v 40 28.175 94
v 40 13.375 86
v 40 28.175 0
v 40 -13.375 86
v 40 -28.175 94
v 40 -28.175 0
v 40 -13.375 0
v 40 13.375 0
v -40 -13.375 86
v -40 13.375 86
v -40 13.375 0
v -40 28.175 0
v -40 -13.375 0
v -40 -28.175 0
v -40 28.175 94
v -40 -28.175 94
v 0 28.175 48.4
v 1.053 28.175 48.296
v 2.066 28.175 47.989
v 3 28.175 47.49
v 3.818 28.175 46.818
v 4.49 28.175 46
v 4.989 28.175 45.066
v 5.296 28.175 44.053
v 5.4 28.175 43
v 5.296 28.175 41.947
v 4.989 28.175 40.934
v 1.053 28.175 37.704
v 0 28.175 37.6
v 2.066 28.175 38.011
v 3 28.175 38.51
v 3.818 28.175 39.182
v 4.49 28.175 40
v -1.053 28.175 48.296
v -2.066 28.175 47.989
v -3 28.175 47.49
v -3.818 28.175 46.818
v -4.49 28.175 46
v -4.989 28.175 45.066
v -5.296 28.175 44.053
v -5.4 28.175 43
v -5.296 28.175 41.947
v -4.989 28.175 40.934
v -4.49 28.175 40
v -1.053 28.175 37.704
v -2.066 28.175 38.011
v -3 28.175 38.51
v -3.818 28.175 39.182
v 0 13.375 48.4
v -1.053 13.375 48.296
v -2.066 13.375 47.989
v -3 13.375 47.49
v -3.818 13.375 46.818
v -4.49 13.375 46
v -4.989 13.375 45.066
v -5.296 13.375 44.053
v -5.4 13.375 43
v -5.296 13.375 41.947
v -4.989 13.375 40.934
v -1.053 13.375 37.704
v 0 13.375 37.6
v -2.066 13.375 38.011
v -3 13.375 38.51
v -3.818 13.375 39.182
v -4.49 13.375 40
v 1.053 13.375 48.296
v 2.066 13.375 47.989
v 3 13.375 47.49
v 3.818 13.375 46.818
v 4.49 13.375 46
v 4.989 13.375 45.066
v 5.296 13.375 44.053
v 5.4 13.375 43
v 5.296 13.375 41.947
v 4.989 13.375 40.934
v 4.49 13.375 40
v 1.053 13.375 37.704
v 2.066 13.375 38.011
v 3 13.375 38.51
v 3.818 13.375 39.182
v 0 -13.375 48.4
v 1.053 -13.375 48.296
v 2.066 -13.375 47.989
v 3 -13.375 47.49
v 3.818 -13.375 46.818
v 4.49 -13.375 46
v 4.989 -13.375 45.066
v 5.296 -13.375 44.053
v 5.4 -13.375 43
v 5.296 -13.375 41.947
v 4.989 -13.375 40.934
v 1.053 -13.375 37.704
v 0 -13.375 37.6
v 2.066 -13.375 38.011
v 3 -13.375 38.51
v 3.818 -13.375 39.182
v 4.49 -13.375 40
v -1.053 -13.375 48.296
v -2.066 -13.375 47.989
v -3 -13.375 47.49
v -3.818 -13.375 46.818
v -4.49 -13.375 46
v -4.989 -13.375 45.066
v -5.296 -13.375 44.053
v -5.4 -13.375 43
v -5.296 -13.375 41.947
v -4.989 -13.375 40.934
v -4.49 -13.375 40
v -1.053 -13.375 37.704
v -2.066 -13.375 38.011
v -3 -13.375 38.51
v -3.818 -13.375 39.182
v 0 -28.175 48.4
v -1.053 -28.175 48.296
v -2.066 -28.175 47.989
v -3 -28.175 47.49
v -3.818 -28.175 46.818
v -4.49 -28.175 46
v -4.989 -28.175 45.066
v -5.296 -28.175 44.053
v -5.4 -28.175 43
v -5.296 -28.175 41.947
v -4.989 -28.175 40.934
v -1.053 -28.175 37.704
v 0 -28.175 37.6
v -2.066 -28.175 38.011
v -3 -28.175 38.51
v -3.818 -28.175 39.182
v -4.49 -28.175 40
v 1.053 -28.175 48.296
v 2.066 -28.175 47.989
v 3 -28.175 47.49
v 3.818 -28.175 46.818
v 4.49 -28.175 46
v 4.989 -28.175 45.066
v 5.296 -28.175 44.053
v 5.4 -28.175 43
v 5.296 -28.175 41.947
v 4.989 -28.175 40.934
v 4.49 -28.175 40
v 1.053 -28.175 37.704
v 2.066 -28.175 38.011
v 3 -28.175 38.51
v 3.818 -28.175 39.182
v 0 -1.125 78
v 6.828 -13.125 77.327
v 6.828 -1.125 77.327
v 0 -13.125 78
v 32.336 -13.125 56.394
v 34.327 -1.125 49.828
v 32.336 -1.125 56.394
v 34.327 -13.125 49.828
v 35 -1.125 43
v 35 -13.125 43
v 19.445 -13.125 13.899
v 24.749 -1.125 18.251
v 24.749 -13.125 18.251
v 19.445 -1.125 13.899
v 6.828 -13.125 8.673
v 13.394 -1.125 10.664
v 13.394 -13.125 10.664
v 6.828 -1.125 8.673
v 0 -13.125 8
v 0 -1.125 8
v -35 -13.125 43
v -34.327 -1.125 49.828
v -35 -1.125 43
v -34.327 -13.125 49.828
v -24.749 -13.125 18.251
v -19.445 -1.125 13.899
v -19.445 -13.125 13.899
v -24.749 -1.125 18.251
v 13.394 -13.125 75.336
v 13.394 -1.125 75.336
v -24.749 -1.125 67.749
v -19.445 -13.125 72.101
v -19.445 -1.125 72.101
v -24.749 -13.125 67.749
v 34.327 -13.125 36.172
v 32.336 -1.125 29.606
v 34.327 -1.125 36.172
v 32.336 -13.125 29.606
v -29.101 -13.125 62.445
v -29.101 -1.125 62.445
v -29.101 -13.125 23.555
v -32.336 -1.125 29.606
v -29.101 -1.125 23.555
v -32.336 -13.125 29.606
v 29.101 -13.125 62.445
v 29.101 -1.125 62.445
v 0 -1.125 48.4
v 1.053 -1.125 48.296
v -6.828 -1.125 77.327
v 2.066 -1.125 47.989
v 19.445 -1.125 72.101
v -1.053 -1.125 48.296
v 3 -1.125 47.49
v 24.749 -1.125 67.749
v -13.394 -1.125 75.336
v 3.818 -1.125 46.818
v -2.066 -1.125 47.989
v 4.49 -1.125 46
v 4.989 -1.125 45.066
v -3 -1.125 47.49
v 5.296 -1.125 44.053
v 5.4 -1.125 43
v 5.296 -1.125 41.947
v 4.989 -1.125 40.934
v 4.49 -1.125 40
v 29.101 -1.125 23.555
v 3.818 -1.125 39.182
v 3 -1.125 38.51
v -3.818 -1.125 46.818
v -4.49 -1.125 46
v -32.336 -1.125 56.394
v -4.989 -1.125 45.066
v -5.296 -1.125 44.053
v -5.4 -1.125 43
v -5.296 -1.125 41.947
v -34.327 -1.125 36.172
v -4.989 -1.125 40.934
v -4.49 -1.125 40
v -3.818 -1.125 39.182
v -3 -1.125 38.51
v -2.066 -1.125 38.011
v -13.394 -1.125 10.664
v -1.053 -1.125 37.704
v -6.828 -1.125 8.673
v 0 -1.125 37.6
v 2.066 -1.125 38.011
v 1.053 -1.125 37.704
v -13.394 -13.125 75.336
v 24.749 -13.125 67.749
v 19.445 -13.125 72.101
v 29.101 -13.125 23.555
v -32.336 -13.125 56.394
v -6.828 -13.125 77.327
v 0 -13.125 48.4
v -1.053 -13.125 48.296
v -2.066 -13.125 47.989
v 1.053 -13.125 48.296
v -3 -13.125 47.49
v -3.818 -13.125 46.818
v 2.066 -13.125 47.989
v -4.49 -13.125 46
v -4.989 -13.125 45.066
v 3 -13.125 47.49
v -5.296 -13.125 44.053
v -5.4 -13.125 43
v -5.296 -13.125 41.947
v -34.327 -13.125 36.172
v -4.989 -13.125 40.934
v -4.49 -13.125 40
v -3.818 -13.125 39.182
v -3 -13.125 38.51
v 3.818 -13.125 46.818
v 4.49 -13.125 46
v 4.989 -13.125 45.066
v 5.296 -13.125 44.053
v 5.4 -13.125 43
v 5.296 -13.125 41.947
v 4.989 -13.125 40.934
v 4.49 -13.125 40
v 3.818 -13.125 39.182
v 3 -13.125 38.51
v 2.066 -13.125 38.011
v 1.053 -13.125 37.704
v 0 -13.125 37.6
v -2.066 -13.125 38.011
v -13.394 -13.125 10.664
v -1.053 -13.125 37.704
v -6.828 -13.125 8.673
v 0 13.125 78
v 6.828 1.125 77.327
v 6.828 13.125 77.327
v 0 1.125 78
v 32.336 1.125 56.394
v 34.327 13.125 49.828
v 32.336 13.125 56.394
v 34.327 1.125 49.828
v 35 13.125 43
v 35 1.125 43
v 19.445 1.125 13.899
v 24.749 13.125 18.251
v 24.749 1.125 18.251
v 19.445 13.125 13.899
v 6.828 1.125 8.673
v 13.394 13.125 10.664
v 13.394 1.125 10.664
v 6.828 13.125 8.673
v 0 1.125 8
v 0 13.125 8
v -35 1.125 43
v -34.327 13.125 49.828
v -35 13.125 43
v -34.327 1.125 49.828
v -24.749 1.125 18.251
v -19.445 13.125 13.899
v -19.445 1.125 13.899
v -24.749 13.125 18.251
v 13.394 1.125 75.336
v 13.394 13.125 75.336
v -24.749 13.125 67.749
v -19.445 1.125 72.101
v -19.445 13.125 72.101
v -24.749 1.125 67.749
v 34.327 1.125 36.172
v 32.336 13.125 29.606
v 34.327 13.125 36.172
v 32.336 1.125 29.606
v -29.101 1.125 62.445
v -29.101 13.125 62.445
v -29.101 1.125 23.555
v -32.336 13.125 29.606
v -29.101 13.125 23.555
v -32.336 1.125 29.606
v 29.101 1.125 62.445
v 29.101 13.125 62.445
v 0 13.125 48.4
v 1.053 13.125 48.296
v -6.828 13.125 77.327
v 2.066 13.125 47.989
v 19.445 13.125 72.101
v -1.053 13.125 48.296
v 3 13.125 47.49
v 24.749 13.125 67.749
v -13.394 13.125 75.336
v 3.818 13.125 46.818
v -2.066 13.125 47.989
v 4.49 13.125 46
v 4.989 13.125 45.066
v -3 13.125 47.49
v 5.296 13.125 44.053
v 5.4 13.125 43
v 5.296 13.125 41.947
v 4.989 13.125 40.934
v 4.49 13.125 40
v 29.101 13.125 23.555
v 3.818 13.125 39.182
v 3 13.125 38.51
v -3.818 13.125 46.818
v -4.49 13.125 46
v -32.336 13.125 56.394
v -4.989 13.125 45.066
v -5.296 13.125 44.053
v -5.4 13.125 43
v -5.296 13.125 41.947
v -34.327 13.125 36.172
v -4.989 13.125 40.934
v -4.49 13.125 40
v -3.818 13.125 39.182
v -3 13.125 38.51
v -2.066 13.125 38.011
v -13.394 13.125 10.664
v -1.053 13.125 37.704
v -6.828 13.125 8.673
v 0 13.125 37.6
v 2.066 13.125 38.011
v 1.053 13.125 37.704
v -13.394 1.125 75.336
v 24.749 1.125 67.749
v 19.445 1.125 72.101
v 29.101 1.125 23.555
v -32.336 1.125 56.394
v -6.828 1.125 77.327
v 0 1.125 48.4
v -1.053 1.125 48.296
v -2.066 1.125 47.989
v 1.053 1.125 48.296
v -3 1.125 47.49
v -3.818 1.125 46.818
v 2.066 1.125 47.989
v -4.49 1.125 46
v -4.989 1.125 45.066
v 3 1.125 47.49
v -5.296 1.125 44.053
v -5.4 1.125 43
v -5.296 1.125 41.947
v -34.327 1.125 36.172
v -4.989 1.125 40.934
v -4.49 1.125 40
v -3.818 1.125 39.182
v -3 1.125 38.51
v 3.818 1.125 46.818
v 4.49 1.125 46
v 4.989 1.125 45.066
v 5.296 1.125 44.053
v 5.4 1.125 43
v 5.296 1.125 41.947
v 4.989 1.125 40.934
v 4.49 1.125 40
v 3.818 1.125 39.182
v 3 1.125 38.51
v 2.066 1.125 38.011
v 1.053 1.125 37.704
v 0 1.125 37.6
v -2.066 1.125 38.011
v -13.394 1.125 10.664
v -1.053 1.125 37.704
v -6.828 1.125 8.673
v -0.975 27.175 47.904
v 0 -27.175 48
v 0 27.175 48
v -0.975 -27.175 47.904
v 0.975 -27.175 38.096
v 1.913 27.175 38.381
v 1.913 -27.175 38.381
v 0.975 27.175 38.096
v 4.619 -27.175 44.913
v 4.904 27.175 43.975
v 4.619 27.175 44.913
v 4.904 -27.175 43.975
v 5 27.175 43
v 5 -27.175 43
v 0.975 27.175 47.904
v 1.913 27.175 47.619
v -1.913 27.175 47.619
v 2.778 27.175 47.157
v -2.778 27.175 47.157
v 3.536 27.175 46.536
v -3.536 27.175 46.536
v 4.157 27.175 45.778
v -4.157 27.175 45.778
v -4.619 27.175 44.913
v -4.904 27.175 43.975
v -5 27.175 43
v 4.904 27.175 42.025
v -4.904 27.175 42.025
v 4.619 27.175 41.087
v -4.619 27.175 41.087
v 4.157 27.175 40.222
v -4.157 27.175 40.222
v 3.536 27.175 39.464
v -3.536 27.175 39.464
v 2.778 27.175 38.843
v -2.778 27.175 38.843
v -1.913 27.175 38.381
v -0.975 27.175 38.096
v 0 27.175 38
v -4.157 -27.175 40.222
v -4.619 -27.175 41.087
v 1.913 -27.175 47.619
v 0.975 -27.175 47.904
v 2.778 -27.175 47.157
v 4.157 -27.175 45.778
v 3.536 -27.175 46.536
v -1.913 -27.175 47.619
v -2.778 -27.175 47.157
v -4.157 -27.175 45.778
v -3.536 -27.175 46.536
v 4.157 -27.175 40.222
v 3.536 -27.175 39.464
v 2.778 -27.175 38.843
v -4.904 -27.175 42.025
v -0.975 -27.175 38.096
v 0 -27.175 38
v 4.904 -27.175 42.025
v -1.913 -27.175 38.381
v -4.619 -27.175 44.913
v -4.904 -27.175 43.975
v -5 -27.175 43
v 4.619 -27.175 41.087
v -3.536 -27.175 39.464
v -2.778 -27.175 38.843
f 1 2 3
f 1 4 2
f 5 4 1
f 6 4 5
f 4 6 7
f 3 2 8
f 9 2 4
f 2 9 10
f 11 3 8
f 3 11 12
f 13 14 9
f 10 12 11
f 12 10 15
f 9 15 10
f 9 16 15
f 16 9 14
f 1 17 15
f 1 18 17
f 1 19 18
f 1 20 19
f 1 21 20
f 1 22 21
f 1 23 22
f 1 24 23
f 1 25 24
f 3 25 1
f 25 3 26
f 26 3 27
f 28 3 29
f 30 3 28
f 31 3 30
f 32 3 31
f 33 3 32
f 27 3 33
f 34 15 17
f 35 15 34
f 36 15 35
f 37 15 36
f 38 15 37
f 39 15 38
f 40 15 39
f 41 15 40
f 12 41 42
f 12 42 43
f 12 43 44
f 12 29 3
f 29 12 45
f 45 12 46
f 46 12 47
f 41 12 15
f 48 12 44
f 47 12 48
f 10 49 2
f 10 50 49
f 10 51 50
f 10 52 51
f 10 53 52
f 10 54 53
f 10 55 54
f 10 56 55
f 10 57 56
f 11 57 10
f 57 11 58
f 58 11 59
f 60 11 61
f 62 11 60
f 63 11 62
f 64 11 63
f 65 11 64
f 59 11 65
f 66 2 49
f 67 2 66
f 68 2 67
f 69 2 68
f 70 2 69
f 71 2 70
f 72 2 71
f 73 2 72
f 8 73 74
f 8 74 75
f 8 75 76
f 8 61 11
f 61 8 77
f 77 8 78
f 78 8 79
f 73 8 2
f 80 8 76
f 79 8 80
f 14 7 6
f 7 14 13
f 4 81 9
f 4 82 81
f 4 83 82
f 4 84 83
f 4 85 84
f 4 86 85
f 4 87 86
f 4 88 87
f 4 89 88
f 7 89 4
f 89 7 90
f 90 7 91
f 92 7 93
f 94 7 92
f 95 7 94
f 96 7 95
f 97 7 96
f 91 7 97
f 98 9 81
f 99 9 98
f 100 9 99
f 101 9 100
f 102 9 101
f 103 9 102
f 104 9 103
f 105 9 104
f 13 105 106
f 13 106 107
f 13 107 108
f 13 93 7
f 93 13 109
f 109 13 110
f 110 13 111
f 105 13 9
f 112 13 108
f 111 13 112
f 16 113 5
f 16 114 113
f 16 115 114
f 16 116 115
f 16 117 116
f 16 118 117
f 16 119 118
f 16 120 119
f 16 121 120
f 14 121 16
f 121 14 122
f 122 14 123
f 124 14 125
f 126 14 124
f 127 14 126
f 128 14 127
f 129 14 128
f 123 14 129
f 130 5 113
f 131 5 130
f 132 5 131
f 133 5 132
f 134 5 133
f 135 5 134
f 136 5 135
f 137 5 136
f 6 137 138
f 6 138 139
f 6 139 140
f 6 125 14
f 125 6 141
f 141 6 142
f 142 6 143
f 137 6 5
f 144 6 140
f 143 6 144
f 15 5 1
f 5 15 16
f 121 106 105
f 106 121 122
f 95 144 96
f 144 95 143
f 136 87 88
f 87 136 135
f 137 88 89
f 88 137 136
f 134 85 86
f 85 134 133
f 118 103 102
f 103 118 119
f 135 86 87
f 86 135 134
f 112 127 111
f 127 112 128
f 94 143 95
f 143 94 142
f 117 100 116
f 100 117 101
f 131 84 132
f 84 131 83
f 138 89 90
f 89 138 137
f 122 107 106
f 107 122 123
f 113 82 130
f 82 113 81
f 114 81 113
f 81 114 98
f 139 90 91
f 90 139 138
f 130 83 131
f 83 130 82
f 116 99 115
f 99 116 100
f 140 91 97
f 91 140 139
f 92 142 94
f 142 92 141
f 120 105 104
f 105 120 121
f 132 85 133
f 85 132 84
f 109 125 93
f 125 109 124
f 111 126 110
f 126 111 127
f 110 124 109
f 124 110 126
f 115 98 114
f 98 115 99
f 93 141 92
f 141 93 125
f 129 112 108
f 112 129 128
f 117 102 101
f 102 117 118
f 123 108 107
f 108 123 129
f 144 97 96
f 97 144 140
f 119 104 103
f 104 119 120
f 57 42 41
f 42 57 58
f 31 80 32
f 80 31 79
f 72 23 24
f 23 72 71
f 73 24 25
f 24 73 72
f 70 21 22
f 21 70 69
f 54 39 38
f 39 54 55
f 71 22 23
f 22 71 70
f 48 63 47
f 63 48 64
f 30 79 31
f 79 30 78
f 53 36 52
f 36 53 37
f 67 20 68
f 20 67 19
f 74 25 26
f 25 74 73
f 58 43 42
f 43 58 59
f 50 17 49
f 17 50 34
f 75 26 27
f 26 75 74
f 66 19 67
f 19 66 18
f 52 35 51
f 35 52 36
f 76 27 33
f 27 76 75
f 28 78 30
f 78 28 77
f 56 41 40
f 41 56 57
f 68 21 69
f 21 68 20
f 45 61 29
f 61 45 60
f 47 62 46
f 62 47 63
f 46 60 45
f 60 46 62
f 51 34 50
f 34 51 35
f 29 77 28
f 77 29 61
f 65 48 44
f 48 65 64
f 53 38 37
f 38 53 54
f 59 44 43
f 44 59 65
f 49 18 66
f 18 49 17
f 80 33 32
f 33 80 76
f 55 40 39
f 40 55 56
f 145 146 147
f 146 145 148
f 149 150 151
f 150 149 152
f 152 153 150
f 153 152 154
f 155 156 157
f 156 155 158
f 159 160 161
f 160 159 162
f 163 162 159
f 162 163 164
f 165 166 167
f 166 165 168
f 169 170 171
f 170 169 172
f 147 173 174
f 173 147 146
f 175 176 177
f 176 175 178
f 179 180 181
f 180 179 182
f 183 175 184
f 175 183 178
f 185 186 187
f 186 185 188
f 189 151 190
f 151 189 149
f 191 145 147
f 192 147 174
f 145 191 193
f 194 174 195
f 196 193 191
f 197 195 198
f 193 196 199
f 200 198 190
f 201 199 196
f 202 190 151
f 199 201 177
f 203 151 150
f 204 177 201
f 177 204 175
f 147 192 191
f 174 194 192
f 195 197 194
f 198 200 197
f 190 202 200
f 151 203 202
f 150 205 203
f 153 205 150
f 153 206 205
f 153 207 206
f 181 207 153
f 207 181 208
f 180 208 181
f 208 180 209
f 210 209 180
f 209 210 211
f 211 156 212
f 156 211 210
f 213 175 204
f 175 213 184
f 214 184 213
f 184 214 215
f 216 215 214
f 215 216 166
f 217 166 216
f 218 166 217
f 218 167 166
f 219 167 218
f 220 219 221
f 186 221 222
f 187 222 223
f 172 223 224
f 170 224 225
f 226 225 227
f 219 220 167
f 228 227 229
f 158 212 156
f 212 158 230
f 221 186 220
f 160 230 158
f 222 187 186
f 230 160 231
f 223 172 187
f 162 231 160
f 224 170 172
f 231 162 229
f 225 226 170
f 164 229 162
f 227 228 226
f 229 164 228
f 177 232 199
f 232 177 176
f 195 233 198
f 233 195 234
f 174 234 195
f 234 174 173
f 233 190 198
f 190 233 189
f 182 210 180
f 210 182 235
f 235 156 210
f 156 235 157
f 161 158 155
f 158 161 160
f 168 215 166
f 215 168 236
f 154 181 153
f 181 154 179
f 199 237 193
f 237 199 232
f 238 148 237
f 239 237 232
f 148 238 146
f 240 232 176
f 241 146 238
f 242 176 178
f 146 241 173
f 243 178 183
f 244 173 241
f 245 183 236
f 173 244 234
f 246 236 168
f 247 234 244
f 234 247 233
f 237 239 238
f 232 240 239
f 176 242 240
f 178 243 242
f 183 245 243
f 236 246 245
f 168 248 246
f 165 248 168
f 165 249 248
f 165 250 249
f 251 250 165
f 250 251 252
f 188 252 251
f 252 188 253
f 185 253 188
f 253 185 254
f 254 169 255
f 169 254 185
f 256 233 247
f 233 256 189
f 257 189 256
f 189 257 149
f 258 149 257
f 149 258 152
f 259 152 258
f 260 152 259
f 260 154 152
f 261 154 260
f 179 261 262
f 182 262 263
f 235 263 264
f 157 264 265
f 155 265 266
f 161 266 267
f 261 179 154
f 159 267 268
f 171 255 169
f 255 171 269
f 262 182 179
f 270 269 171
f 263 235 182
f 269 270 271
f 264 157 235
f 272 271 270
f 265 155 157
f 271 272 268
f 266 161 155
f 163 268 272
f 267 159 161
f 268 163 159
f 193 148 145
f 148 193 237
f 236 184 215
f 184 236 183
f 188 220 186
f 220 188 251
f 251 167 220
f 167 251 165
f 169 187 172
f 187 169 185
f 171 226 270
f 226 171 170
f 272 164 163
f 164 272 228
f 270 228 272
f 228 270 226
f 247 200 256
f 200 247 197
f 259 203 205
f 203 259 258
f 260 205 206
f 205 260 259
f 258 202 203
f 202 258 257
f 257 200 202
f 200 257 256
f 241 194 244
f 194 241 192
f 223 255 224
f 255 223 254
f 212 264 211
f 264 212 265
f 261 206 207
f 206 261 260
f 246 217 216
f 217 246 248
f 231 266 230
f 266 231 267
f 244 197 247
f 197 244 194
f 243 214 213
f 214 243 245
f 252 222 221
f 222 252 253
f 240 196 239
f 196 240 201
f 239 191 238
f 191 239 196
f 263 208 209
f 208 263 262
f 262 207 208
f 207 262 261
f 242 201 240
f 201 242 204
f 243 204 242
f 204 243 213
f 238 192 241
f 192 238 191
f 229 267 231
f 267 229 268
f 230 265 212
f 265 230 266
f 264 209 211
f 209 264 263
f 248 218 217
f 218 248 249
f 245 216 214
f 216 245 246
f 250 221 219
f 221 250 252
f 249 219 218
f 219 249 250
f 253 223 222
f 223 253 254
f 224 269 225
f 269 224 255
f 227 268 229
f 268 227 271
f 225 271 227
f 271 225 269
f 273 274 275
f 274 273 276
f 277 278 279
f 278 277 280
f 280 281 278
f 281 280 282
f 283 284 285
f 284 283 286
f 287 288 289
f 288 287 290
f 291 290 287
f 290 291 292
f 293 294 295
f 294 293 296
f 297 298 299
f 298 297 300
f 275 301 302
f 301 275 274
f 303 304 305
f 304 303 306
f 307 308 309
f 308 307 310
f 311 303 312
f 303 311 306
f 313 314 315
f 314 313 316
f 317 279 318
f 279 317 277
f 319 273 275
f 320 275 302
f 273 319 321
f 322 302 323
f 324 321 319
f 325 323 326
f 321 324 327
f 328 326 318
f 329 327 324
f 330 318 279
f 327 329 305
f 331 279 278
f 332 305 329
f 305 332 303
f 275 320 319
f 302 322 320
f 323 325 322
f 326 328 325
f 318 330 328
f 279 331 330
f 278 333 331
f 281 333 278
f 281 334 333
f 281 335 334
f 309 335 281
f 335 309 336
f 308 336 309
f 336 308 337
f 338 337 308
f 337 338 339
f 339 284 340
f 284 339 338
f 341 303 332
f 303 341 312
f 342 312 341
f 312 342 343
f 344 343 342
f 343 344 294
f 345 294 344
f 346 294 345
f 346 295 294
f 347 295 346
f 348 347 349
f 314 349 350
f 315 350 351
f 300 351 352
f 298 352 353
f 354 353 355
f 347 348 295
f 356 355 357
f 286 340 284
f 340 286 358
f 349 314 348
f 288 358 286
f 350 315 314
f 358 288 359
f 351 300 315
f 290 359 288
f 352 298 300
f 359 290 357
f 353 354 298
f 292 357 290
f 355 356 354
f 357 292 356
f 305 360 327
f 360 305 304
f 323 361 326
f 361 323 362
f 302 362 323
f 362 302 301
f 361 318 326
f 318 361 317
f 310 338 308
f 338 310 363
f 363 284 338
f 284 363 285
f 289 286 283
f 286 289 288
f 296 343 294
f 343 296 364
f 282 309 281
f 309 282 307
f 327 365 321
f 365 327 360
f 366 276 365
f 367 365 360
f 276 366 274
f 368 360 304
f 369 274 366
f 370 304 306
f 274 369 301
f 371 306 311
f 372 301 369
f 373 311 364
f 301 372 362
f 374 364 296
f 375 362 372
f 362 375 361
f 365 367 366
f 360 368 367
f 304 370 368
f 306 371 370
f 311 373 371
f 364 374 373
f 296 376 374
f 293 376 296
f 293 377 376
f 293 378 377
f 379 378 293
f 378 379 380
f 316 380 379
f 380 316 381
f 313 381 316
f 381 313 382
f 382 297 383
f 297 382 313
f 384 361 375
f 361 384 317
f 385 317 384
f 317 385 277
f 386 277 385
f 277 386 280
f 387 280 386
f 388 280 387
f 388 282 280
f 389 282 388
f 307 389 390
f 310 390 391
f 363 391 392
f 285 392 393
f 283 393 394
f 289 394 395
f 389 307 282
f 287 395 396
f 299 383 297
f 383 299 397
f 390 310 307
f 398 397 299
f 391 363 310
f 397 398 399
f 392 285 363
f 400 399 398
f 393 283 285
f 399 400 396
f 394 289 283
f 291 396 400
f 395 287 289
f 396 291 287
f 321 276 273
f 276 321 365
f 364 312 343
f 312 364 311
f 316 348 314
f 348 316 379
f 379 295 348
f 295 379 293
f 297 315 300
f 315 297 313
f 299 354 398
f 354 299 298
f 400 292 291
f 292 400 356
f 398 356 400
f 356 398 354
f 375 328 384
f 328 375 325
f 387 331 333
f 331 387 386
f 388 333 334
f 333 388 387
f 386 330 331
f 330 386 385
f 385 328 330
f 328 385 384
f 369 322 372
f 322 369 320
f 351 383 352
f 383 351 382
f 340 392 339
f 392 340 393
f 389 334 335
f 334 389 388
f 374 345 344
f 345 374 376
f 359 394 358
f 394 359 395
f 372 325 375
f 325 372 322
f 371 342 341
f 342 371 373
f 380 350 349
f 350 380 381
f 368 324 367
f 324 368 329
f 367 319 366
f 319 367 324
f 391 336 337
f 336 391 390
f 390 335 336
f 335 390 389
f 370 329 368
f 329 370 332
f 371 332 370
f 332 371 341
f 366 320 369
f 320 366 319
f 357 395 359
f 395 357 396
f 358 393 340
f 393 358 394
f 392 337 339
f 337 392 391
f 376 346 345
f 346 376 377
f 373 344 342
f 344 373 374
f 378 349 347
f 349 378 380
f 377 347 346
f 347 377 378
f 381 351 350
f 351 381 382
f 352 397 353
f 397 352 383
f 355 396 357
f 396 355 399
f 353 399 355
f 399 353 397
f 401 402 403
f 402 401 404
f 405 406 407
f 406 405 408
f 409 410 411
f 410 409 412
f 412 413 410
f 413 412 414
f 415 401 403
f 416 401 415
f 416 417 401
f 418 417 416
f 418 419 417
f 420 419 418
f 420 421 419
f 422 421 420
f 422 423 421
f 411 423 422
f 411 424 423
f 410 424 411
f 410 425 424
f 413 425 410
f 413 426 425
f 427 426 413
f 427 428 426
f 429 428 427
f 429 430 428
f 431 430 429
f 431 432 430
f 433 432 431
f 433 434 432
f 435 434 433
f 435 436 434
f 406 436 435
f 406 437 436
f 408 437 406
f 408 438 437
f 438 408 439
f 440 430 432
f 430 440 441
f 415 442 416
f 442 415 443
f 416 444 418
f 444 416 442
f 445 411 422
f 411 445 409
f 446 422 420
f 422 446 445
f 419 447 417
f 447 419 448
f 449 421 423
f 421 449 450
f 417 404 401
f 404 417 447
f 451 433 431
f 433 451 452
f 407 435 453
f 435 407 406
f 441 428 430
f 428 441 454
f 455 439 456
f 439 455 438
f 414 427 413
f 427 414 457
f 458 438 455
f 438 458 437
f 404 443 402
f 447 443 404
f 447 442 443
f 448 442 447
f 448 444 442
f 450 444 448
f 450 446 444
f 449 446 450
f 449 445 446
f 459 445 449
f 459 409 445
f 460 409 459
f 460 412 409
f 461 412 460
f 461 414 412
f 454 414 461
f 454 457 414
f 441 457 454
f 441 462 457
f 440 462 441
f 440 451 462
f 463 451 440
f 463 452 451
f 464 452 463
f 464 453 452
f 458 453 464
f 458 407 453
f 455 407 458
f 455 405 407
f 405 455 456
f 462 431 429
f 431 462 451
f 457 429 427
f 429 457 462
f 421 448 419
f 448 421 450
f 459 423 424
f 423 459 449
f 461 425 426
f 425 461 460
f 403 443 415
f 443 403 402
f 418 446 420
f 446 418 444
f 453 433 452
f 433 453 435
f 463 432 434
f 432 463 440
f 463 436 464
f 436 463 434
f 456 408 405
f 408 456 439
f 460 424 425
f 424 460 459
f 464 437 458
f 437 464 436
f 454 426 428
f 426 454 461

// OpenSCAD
$fn = 32;

// ------------------------------------------------------------------------
// Trolley wheel set: wheels d70, fork 86 mm tall
// Every part is its own module, assembly() places every instance.
// ------------------------------------------------------------------------

// --- part 1 ---
module trolley_fork() {
  difference() {
    union() {
      translate([-40, 13.375, 0]) cube([80, 14.8, 86]);
      translate([-40, -28.175, 0]) cube([80, 14.8, 86]);
      translate([-40, -28.175, 86]) cube([80, 56.35, 8]);
    }
    translate([0, -20.775, 43]) rotate([90, 0, 0]) cylinder(h = 16.8, d = 10.8, center = true);
    translate([0, 20.775, 43]) rotate([90, 0, 0]) cylinder(h = 16.8, d = 10.8, center = true);
  }
}

// --- part 2 ---
module trolley_wheel() {
  difference() {
      translate([0, 0, 0]) cylinder(h = 12, d = 70);
      translate([0, 0, -1]) cylinder(h = 14, d = 10.8);
    }
}

// --- part 3 ---
module trolley_axle() {
  translate([0, 0, -27.175]) cylinder(h = 54.35, d = 10);
}

// --- assembly ---
module assembly() {
  color([0.80, 0.24, 0.20]) translate([0, 0, 0]) rotate([0, 0, 0]) trolley_fork();
  color([0.20, 0.45, 0.75]) translate([0, -1.125, 43]) rotate([90, 0, 0]) trolley_wheel();
  color([0.25, 0.62, 0.32]) translate([0, 13.125, 43]) rotate([90, 0, 0]) trolley_wheel();
  color([0.92, 0.70, 0.18]) translate([0, 0, 43]) rotate([90, 0, 0]) trolley_axle();
}

assembly();
